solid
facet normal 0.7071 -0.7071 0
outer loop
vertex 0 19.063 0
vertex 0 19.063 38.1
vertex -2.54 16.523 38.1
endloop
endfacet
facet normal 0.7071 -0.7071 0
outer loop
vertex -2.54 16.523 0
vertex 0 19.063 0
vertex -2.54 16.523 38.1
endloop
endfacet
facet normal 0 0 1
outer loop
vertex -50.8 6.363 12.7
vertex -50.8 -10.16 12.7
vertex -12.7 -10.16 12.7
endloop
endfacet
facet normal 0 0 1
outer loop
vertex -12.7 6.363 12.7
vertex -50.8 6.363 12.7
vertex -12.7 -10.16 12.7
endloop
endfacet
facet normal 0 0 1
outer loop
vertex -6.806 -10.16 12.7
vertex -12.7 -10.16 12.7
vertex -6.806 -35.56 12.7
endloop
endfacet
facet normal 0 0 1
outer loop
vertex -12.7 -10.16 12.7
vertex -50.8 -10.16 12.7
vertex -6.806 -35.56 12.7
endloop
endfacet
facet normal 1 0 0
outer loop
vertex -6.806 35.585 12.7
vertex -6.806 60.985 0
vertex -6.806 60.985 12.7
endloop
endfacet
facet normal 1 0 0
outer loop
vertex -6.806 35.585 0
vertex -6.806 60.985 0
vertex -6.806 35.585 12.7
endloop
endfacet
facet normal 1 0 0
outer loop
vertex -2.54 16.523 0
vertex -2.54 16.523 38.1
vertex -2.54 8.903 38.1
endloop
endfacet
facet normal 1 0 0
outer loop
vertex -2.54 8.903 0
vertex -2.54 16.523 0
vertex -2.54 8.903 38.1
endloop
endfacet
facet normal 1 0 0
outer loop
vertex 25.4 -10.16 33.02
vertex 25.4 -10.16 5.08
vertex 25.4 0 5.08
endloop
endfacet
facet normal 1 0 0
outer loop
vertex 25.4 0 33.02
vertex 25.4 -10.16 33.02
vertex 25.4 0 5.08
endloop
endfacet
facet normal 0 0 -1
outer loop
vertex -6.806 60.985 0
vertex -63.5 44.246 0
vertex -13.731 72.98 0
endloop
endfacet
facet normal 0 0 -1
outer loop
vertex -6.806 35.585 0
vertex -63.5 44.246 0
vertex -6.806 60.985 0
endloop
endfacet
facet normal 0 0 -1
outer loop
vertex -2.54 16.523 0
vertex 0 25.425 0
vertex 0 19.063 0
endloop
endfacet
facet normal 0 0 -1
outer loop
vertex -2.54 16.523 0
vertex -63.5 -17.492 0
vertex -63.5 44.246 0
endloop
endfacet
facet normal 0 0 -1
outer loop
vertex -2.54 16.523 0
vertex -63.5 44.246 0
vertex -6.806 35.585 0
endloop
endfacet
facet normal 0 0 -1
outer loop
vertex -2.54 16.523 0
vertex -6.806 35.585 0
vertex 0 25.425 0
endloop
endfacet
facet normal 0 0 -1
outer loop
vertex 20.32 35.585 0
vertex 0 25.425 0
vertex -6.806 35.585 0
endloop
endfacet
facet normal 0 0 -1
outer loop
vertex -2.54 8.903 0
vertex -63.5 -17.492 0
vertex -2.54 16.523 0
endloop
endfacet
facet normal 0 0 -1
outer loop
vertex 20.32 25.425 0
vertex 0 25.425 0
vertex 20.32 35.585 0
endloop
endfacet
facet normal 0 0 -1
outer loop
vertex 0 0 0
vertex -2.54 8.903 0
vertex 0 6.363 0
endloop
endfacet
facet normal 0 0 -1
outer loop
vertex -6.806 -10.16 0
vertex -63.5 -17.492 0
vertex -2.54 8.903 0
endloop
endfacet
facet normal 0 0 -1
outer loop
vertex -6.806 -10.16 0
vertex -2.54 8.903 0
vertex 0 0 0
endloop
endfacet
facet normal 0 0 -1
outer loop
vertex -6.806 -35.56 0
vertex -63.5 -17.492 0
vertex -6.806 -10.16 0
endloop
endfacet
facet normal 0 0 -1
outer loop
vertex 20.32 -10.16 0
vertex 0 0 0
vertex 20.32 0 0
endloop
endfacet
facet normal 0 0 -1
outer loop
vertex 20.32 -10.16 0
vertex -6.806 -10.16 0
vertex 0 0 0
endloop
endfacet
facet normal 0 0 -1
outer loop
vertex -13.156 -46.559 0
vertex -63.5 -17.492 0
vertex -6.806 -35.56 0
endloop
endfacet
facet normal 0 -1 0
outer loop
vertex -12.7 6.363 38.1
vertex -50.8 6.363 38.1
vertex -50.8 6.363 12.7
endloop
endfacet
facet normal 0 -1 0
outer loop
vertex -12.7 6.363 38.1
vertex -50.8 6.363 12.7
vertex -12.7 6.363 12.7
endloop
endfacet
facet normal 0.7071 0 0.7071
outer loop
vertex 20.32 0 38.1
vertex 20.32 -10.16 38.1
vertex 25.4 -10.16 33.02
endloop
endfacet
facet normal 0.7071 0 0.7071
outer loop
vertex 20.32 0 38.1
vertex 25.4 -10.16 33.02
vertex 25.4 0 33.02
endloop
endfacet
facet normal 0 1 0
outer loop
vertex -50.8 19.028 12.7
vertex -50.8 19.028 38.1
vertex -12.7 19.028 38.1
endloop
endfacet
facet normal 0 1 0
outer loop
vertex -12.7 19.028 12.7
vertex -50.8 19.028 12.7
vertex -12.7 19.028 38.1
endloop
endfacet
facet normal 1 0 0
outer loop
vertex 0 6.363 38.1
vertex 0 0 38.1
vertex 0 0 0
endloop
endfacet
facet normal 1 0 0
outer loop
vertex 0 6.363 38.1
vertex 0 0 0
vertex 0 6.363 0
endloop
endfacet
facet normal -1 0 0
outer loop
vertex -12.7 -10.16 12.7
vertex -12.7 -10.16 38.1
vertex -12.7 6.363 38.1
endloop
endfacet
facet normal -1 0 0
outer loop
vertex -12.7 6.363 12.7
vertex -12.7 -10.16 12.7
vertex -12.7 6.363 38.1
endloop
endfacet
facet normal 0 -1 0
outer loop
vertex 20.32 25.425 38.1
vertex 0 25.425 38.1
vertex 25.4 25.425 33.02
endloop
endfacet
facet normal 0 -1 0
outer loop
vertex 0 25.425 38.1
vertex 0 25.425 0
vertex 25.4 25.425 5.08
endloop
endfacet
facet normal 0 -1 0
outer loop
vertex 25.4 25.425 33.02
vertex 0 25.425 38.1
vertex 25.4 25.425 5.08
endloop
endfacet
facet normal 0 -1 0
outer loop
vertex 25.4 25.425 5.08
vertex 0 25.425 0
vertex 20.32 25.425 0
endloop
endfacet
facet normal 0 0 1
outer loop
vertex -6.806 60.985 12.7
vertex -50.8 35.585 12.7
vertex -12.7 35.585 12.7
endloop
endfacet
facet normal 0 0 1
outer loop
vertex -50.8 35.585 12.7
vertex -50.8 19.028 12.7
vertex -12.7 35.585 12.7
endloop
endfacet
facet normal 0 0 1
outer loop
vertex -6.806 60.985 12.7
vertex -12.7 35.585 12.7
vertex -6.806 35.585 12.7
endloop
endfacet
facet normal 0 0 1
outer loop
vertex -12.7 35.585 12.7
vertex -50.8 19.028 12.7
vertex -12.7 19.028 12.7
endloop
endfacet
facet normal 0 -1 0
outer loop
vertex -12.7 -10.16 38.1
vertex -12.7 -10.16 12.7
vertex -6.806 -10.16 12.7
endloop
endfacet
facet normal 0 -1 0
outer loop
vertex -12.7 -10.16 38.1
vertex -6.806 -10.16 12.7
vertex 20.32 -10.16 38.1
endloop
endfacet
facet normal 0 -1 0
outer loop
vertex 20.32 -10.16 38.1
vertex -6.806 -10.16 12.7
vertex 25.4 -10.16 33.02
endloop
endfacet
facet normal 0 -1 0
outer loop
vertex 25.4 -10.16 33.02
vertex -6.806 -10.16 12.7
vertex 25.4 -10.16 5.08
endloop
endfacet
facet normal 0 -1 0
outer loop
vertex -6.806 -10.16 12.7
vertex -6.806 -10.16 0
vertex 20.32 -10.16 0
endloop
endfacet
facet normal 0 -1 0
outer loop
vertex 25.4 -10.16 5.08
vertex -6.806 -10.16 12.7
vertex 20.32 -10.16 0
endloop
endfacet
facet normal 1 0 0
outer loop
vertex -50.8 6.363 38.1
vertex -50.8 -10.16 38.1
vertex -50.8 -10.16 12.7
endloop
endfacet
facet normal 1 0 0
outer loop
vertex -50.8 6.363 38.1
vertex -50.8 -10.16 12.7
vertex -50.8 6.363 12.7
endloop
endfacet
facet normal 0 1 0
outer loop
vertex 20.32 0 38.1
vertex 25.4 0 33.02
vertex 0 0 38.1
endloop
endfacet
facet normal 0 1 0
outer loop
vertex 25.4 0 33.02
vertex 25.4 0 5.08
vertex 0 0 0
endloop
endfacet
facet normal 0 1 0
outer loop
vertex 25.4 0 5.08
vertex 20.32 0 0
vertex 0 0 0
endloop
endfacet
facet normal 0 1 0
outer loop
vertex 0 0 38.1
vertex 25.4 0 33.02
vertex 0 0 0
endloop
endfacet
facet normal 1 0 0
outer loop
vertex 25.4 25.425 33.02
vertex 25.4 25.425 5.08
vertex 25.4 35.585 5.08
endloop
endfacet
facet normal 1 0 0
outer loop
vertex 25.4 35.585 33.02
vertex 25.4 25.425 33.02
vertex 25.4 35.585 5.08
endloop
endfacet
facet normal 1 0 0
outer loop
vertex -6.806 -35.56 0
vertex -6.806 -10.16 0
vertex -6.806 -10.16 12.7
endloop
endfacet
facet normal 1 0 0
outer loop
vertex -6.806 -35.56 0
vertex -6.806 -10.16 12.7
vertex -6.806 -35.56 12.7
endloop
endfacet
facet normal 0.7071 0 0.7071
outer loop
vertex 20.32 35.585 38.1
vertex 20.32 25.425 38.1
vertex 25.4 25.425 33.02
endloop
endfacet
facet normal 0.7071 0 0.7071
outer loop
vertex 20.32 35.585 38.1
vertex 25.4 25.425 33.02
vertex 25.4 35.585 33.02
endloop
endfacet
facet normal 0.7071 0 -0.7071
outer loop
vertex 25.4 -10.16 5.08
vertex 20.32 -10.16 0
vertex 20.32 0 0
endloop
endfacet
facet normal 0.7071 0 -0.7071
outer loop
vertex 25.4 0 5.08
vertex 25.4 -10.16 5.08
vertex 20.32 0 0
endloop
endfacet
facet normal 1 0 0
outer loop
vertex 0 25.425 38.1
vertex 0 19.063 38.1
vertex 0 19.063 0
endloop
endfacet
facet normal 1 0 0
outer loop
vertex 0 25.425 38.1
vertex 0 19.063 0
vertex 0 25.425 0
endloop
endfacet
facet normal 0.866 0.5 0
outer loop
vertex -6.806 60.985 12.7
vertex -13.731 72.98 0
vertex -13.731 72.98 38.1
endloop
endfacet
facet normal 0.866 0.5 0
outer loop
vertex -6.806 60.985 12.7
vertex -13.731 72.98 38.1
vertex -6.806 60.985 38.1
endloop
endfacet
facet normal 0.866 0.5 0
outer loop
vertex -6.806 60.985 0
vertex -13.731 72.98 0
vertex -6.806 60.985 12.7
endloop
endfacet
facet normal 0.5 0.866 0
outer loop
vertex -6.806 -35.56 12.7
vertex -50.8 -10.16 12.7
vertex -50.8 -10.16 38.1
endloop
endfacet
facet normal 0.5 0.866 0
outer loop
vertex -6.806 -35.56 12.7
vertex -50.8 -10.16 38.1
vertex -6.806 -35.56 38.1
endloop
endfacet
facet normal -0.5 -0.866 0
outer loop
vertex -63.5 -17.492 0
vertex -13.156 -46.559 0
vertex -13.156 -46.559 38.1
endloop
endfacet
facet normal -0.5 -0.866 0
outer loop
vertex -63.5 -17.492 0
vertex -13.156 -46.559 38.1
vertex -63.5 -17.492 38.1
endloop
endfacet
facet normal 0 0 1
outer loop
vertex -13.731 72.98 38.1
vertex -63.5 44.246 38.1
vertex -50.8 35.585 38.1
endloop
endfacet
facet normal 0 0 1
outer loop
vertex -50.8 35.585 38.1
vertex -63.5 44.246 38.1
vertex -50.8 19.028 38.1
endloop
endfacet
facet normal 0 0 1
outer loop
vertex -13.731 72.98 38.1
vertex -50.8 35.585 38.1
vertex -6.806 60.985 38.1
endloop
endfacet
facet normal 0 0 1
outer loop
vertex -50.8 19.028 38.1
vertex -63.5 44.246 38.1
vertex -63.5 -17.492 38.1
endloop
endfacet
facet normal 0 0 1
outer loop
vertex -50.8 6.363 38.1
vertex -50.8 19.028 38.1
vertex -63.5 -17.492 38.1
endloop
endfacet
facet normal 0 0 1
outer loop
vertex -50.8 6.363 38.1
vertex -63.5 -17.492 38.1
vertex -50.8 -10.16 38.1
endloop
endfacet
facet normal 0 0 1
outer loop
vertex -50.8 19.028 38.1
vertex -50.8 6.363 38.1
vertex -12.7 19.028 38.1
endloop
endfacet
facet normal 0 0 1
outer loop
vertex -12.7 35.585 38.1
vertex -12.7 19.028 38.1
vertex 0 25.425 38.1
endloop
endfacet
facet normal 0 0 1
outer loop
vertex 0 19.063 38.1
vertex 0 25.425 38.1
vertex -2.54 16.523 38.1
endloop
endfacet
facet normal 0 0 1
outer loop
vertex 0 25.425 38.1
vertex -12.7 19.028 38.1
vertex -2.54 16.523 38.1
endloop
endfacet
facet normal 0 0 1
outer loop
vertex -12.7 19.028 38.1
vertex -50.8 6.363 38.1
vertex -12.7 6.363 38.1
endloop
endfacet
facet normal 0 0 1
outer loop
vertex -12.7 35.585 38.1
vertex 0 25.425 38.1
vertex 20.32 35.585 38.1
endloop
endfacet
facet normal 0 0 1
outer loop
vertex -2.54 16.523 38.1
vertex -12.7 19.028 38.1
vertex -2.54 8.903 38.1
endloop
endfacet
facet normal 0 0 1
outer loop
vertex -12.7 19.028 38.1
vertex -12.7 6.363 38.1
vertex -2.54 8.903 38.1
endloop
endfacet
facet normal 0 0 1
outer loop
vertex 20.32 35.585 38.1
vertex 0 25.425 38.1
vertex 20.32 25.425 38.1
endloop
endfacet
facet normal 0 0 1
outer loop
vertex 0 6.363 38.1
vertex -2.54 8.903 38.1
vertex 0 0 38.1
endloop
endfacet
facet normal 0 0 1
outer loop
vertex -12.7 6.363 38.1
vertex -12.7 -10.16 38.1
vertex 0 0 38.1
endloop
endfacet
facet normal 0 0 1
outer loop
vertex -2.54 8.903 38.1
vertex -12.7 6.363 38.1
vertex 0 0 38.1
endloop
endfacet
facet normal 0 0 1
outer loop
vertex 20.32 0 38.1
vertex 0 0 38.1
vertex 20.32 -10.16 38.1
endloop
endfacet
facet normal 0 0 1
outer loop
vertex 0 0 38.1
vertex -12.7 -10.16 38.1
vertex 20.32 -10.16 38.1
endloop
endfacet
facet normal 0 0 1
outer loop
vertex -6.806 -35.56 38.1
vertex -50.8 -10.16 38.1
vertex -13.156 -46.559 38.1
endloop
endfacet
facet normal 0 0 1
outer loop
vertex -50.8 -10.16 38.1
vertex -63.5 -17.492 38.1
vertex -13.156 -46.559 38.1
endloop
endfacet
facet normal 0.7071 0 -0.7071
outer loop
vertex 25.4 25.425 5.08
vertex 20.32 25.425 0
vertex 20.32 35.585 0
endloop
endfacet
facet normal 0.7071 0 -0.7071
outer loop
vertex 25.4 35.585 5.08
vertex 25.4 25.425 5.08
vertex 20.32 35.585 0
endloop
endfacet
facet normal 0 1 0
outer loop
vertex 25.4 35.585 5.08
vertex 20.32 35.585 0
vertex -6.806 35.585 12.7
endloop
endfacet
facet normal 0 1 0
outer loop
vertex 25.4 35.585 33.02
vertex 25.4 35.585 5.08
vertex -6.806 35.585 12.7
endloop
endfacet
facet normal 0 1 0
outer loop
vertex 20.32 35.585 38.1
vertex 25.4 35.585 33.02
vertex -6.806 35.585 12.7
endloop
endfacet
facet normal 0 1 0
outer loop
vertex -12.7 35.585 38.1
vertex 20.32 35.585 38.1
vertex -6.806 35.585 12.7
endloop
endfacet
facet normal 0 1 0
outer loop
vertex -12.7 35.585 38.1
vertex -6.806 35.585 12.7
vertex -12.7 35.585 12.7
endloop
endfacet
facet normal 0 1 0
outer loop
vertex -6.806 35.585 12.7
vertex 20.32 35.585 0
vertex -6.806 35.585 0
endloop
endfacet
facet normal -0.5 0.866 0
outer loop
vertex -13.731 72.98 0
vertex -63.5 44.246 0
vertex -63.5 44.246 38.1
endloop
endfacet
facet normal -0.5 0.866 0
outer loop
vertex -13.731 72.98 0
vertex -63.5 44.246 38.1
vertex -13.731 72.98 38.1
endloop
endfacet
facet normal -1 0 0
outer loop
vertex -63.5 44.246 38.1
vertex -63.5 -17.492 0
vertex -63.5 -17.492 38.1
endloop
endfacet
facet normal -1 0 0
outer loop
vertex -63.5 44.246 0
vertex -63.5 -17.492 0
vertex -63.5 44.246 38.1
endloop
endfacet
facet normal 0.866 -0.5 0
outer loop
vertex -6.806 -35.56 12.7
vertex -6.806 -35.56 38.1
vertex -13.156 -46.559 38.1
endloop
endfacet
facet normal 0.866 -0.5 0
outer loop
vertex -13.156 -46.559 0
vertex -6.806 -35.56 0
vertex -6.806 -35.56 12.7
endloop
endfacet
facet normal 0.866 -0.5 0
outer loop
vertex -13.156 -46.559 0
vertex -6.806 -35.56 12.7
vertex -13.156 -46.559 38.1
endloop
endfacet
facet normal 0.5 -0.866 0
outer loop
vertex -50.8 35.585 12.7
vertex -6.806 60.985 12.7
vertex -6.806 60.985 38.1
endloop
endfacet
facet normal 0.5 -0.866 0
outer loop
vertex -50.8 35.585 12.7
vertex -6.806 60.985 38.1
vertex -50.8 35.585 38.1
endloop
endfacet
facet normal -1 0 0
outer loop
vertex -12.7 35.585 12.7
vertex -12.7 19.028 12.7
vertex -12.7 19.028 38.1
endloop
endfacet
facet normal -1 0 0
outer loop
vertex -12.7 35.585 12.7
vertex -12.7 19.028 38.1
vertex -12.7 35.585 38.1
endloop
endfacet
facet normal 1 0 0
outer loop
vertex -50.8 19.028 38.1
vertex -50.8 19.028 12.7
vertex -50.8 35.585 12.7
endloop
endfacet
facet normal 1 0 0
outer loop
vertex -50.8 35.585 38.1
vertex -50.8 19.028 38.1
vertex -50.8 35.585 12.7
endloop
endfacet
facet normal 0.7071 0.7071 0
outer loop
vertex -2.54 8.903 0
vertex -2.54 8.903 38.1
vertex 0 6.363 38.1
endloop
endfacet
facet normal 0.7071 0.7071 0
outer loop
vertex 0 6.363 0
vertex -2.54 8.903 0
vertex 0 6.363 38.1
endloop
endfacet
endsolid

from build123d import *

# Parameters (mm, degrees)
F1_DEPTH  = 38.1
F2_SIZE   = 5.08
F4_DEPTH  = 38.1
F6_DEPTH  = 12.7
F7_W      = 38.1
F7_H      = 16.5227
F7_H_2    = 16.557139
F8_DEPTH  = 25.4
F10_DEPTH = 38.101


with BuildPart() as f1:
    # F0 (on Top) → F1 (new body)
    with BuildSketch(Plane.XY):
        Polygon((0, 0), (0, 25.4254), (25.4, 25.4254), (25.4, 35.5854), (-50.8, 35.5854), (-50.8, -10.16), (25.4, -10.16), (25.4, 0), align=None)
    extrude(amount=F1_DEPTH)

    # F2
    f2_edges = [f1.edges().sort_by_distance(p)[0] for p in [
        (25.4, -5.08, 0),
        (25.4, 30.5054, 0),
        (25.4, -5.08, 38.1),
        (25.4, 30.5054, 38.1),
    ]]
    chamfer(f2_edges, length=F2_SIZE)

    # F3 (on face) → F4 (join)
    with BuildSketch(Plane(origin=(0, 0, 0), x_dir=(1, 0, 0), z_dir=(0, 0, -1))):
        Polygon((-50.8, -35.5854), (-50.8, 10.16), (-6.805909, 35.56), (-13.155909, 46.558523), (-63.5, 17.492348), (-63.5, 10.16), (-63.5, -35.5854), (-63.5, -44.245531), (-13.730856, -72.97976), (-6.805909, -60.9854), align=None)
    extrude(amount=-F4_DEPTH)

    # F5 (on face) → F6 (join)
    with BuildSketch(Plane(origin=(0, 0, 0), x_dir=(1, 0, 0), z_dir=(0, 0, -1))):
        Polygon((-6.805909, -60.9854), (-6.805909, 35.56), (-50.8, 10.16), (-50.8, -35.5854), align=None)
    extrude(amount=-F6_DEPTH)

    # F7 (on face) → F8 (cut, through all)
    with BuildSketch(Plane.XY.offset(38.1)):
        with Locations((-31.75, -1.89865)):
            Rectangle(F7_W, F7_H)
        with Locations((-31.75, 27.306831)):
            Rectangle(F7_W, F7_H_2)
    extrude(amount=-F8_DEPTH, mode=Mode.SUBTRACT)

    # F9 (on face) → F10 (cut, through all)
    with BuildSketch(Plane.XY.offset(38.1)):
        Polygon((-2.54, 16.5227), (-2.54, 8.9027), (0, 6.3627), (0, 19.0627), align=None)
    extrude(amount=-F10_DEPTH, mode=Mode.SUBTRACT)


solid = f1.part
